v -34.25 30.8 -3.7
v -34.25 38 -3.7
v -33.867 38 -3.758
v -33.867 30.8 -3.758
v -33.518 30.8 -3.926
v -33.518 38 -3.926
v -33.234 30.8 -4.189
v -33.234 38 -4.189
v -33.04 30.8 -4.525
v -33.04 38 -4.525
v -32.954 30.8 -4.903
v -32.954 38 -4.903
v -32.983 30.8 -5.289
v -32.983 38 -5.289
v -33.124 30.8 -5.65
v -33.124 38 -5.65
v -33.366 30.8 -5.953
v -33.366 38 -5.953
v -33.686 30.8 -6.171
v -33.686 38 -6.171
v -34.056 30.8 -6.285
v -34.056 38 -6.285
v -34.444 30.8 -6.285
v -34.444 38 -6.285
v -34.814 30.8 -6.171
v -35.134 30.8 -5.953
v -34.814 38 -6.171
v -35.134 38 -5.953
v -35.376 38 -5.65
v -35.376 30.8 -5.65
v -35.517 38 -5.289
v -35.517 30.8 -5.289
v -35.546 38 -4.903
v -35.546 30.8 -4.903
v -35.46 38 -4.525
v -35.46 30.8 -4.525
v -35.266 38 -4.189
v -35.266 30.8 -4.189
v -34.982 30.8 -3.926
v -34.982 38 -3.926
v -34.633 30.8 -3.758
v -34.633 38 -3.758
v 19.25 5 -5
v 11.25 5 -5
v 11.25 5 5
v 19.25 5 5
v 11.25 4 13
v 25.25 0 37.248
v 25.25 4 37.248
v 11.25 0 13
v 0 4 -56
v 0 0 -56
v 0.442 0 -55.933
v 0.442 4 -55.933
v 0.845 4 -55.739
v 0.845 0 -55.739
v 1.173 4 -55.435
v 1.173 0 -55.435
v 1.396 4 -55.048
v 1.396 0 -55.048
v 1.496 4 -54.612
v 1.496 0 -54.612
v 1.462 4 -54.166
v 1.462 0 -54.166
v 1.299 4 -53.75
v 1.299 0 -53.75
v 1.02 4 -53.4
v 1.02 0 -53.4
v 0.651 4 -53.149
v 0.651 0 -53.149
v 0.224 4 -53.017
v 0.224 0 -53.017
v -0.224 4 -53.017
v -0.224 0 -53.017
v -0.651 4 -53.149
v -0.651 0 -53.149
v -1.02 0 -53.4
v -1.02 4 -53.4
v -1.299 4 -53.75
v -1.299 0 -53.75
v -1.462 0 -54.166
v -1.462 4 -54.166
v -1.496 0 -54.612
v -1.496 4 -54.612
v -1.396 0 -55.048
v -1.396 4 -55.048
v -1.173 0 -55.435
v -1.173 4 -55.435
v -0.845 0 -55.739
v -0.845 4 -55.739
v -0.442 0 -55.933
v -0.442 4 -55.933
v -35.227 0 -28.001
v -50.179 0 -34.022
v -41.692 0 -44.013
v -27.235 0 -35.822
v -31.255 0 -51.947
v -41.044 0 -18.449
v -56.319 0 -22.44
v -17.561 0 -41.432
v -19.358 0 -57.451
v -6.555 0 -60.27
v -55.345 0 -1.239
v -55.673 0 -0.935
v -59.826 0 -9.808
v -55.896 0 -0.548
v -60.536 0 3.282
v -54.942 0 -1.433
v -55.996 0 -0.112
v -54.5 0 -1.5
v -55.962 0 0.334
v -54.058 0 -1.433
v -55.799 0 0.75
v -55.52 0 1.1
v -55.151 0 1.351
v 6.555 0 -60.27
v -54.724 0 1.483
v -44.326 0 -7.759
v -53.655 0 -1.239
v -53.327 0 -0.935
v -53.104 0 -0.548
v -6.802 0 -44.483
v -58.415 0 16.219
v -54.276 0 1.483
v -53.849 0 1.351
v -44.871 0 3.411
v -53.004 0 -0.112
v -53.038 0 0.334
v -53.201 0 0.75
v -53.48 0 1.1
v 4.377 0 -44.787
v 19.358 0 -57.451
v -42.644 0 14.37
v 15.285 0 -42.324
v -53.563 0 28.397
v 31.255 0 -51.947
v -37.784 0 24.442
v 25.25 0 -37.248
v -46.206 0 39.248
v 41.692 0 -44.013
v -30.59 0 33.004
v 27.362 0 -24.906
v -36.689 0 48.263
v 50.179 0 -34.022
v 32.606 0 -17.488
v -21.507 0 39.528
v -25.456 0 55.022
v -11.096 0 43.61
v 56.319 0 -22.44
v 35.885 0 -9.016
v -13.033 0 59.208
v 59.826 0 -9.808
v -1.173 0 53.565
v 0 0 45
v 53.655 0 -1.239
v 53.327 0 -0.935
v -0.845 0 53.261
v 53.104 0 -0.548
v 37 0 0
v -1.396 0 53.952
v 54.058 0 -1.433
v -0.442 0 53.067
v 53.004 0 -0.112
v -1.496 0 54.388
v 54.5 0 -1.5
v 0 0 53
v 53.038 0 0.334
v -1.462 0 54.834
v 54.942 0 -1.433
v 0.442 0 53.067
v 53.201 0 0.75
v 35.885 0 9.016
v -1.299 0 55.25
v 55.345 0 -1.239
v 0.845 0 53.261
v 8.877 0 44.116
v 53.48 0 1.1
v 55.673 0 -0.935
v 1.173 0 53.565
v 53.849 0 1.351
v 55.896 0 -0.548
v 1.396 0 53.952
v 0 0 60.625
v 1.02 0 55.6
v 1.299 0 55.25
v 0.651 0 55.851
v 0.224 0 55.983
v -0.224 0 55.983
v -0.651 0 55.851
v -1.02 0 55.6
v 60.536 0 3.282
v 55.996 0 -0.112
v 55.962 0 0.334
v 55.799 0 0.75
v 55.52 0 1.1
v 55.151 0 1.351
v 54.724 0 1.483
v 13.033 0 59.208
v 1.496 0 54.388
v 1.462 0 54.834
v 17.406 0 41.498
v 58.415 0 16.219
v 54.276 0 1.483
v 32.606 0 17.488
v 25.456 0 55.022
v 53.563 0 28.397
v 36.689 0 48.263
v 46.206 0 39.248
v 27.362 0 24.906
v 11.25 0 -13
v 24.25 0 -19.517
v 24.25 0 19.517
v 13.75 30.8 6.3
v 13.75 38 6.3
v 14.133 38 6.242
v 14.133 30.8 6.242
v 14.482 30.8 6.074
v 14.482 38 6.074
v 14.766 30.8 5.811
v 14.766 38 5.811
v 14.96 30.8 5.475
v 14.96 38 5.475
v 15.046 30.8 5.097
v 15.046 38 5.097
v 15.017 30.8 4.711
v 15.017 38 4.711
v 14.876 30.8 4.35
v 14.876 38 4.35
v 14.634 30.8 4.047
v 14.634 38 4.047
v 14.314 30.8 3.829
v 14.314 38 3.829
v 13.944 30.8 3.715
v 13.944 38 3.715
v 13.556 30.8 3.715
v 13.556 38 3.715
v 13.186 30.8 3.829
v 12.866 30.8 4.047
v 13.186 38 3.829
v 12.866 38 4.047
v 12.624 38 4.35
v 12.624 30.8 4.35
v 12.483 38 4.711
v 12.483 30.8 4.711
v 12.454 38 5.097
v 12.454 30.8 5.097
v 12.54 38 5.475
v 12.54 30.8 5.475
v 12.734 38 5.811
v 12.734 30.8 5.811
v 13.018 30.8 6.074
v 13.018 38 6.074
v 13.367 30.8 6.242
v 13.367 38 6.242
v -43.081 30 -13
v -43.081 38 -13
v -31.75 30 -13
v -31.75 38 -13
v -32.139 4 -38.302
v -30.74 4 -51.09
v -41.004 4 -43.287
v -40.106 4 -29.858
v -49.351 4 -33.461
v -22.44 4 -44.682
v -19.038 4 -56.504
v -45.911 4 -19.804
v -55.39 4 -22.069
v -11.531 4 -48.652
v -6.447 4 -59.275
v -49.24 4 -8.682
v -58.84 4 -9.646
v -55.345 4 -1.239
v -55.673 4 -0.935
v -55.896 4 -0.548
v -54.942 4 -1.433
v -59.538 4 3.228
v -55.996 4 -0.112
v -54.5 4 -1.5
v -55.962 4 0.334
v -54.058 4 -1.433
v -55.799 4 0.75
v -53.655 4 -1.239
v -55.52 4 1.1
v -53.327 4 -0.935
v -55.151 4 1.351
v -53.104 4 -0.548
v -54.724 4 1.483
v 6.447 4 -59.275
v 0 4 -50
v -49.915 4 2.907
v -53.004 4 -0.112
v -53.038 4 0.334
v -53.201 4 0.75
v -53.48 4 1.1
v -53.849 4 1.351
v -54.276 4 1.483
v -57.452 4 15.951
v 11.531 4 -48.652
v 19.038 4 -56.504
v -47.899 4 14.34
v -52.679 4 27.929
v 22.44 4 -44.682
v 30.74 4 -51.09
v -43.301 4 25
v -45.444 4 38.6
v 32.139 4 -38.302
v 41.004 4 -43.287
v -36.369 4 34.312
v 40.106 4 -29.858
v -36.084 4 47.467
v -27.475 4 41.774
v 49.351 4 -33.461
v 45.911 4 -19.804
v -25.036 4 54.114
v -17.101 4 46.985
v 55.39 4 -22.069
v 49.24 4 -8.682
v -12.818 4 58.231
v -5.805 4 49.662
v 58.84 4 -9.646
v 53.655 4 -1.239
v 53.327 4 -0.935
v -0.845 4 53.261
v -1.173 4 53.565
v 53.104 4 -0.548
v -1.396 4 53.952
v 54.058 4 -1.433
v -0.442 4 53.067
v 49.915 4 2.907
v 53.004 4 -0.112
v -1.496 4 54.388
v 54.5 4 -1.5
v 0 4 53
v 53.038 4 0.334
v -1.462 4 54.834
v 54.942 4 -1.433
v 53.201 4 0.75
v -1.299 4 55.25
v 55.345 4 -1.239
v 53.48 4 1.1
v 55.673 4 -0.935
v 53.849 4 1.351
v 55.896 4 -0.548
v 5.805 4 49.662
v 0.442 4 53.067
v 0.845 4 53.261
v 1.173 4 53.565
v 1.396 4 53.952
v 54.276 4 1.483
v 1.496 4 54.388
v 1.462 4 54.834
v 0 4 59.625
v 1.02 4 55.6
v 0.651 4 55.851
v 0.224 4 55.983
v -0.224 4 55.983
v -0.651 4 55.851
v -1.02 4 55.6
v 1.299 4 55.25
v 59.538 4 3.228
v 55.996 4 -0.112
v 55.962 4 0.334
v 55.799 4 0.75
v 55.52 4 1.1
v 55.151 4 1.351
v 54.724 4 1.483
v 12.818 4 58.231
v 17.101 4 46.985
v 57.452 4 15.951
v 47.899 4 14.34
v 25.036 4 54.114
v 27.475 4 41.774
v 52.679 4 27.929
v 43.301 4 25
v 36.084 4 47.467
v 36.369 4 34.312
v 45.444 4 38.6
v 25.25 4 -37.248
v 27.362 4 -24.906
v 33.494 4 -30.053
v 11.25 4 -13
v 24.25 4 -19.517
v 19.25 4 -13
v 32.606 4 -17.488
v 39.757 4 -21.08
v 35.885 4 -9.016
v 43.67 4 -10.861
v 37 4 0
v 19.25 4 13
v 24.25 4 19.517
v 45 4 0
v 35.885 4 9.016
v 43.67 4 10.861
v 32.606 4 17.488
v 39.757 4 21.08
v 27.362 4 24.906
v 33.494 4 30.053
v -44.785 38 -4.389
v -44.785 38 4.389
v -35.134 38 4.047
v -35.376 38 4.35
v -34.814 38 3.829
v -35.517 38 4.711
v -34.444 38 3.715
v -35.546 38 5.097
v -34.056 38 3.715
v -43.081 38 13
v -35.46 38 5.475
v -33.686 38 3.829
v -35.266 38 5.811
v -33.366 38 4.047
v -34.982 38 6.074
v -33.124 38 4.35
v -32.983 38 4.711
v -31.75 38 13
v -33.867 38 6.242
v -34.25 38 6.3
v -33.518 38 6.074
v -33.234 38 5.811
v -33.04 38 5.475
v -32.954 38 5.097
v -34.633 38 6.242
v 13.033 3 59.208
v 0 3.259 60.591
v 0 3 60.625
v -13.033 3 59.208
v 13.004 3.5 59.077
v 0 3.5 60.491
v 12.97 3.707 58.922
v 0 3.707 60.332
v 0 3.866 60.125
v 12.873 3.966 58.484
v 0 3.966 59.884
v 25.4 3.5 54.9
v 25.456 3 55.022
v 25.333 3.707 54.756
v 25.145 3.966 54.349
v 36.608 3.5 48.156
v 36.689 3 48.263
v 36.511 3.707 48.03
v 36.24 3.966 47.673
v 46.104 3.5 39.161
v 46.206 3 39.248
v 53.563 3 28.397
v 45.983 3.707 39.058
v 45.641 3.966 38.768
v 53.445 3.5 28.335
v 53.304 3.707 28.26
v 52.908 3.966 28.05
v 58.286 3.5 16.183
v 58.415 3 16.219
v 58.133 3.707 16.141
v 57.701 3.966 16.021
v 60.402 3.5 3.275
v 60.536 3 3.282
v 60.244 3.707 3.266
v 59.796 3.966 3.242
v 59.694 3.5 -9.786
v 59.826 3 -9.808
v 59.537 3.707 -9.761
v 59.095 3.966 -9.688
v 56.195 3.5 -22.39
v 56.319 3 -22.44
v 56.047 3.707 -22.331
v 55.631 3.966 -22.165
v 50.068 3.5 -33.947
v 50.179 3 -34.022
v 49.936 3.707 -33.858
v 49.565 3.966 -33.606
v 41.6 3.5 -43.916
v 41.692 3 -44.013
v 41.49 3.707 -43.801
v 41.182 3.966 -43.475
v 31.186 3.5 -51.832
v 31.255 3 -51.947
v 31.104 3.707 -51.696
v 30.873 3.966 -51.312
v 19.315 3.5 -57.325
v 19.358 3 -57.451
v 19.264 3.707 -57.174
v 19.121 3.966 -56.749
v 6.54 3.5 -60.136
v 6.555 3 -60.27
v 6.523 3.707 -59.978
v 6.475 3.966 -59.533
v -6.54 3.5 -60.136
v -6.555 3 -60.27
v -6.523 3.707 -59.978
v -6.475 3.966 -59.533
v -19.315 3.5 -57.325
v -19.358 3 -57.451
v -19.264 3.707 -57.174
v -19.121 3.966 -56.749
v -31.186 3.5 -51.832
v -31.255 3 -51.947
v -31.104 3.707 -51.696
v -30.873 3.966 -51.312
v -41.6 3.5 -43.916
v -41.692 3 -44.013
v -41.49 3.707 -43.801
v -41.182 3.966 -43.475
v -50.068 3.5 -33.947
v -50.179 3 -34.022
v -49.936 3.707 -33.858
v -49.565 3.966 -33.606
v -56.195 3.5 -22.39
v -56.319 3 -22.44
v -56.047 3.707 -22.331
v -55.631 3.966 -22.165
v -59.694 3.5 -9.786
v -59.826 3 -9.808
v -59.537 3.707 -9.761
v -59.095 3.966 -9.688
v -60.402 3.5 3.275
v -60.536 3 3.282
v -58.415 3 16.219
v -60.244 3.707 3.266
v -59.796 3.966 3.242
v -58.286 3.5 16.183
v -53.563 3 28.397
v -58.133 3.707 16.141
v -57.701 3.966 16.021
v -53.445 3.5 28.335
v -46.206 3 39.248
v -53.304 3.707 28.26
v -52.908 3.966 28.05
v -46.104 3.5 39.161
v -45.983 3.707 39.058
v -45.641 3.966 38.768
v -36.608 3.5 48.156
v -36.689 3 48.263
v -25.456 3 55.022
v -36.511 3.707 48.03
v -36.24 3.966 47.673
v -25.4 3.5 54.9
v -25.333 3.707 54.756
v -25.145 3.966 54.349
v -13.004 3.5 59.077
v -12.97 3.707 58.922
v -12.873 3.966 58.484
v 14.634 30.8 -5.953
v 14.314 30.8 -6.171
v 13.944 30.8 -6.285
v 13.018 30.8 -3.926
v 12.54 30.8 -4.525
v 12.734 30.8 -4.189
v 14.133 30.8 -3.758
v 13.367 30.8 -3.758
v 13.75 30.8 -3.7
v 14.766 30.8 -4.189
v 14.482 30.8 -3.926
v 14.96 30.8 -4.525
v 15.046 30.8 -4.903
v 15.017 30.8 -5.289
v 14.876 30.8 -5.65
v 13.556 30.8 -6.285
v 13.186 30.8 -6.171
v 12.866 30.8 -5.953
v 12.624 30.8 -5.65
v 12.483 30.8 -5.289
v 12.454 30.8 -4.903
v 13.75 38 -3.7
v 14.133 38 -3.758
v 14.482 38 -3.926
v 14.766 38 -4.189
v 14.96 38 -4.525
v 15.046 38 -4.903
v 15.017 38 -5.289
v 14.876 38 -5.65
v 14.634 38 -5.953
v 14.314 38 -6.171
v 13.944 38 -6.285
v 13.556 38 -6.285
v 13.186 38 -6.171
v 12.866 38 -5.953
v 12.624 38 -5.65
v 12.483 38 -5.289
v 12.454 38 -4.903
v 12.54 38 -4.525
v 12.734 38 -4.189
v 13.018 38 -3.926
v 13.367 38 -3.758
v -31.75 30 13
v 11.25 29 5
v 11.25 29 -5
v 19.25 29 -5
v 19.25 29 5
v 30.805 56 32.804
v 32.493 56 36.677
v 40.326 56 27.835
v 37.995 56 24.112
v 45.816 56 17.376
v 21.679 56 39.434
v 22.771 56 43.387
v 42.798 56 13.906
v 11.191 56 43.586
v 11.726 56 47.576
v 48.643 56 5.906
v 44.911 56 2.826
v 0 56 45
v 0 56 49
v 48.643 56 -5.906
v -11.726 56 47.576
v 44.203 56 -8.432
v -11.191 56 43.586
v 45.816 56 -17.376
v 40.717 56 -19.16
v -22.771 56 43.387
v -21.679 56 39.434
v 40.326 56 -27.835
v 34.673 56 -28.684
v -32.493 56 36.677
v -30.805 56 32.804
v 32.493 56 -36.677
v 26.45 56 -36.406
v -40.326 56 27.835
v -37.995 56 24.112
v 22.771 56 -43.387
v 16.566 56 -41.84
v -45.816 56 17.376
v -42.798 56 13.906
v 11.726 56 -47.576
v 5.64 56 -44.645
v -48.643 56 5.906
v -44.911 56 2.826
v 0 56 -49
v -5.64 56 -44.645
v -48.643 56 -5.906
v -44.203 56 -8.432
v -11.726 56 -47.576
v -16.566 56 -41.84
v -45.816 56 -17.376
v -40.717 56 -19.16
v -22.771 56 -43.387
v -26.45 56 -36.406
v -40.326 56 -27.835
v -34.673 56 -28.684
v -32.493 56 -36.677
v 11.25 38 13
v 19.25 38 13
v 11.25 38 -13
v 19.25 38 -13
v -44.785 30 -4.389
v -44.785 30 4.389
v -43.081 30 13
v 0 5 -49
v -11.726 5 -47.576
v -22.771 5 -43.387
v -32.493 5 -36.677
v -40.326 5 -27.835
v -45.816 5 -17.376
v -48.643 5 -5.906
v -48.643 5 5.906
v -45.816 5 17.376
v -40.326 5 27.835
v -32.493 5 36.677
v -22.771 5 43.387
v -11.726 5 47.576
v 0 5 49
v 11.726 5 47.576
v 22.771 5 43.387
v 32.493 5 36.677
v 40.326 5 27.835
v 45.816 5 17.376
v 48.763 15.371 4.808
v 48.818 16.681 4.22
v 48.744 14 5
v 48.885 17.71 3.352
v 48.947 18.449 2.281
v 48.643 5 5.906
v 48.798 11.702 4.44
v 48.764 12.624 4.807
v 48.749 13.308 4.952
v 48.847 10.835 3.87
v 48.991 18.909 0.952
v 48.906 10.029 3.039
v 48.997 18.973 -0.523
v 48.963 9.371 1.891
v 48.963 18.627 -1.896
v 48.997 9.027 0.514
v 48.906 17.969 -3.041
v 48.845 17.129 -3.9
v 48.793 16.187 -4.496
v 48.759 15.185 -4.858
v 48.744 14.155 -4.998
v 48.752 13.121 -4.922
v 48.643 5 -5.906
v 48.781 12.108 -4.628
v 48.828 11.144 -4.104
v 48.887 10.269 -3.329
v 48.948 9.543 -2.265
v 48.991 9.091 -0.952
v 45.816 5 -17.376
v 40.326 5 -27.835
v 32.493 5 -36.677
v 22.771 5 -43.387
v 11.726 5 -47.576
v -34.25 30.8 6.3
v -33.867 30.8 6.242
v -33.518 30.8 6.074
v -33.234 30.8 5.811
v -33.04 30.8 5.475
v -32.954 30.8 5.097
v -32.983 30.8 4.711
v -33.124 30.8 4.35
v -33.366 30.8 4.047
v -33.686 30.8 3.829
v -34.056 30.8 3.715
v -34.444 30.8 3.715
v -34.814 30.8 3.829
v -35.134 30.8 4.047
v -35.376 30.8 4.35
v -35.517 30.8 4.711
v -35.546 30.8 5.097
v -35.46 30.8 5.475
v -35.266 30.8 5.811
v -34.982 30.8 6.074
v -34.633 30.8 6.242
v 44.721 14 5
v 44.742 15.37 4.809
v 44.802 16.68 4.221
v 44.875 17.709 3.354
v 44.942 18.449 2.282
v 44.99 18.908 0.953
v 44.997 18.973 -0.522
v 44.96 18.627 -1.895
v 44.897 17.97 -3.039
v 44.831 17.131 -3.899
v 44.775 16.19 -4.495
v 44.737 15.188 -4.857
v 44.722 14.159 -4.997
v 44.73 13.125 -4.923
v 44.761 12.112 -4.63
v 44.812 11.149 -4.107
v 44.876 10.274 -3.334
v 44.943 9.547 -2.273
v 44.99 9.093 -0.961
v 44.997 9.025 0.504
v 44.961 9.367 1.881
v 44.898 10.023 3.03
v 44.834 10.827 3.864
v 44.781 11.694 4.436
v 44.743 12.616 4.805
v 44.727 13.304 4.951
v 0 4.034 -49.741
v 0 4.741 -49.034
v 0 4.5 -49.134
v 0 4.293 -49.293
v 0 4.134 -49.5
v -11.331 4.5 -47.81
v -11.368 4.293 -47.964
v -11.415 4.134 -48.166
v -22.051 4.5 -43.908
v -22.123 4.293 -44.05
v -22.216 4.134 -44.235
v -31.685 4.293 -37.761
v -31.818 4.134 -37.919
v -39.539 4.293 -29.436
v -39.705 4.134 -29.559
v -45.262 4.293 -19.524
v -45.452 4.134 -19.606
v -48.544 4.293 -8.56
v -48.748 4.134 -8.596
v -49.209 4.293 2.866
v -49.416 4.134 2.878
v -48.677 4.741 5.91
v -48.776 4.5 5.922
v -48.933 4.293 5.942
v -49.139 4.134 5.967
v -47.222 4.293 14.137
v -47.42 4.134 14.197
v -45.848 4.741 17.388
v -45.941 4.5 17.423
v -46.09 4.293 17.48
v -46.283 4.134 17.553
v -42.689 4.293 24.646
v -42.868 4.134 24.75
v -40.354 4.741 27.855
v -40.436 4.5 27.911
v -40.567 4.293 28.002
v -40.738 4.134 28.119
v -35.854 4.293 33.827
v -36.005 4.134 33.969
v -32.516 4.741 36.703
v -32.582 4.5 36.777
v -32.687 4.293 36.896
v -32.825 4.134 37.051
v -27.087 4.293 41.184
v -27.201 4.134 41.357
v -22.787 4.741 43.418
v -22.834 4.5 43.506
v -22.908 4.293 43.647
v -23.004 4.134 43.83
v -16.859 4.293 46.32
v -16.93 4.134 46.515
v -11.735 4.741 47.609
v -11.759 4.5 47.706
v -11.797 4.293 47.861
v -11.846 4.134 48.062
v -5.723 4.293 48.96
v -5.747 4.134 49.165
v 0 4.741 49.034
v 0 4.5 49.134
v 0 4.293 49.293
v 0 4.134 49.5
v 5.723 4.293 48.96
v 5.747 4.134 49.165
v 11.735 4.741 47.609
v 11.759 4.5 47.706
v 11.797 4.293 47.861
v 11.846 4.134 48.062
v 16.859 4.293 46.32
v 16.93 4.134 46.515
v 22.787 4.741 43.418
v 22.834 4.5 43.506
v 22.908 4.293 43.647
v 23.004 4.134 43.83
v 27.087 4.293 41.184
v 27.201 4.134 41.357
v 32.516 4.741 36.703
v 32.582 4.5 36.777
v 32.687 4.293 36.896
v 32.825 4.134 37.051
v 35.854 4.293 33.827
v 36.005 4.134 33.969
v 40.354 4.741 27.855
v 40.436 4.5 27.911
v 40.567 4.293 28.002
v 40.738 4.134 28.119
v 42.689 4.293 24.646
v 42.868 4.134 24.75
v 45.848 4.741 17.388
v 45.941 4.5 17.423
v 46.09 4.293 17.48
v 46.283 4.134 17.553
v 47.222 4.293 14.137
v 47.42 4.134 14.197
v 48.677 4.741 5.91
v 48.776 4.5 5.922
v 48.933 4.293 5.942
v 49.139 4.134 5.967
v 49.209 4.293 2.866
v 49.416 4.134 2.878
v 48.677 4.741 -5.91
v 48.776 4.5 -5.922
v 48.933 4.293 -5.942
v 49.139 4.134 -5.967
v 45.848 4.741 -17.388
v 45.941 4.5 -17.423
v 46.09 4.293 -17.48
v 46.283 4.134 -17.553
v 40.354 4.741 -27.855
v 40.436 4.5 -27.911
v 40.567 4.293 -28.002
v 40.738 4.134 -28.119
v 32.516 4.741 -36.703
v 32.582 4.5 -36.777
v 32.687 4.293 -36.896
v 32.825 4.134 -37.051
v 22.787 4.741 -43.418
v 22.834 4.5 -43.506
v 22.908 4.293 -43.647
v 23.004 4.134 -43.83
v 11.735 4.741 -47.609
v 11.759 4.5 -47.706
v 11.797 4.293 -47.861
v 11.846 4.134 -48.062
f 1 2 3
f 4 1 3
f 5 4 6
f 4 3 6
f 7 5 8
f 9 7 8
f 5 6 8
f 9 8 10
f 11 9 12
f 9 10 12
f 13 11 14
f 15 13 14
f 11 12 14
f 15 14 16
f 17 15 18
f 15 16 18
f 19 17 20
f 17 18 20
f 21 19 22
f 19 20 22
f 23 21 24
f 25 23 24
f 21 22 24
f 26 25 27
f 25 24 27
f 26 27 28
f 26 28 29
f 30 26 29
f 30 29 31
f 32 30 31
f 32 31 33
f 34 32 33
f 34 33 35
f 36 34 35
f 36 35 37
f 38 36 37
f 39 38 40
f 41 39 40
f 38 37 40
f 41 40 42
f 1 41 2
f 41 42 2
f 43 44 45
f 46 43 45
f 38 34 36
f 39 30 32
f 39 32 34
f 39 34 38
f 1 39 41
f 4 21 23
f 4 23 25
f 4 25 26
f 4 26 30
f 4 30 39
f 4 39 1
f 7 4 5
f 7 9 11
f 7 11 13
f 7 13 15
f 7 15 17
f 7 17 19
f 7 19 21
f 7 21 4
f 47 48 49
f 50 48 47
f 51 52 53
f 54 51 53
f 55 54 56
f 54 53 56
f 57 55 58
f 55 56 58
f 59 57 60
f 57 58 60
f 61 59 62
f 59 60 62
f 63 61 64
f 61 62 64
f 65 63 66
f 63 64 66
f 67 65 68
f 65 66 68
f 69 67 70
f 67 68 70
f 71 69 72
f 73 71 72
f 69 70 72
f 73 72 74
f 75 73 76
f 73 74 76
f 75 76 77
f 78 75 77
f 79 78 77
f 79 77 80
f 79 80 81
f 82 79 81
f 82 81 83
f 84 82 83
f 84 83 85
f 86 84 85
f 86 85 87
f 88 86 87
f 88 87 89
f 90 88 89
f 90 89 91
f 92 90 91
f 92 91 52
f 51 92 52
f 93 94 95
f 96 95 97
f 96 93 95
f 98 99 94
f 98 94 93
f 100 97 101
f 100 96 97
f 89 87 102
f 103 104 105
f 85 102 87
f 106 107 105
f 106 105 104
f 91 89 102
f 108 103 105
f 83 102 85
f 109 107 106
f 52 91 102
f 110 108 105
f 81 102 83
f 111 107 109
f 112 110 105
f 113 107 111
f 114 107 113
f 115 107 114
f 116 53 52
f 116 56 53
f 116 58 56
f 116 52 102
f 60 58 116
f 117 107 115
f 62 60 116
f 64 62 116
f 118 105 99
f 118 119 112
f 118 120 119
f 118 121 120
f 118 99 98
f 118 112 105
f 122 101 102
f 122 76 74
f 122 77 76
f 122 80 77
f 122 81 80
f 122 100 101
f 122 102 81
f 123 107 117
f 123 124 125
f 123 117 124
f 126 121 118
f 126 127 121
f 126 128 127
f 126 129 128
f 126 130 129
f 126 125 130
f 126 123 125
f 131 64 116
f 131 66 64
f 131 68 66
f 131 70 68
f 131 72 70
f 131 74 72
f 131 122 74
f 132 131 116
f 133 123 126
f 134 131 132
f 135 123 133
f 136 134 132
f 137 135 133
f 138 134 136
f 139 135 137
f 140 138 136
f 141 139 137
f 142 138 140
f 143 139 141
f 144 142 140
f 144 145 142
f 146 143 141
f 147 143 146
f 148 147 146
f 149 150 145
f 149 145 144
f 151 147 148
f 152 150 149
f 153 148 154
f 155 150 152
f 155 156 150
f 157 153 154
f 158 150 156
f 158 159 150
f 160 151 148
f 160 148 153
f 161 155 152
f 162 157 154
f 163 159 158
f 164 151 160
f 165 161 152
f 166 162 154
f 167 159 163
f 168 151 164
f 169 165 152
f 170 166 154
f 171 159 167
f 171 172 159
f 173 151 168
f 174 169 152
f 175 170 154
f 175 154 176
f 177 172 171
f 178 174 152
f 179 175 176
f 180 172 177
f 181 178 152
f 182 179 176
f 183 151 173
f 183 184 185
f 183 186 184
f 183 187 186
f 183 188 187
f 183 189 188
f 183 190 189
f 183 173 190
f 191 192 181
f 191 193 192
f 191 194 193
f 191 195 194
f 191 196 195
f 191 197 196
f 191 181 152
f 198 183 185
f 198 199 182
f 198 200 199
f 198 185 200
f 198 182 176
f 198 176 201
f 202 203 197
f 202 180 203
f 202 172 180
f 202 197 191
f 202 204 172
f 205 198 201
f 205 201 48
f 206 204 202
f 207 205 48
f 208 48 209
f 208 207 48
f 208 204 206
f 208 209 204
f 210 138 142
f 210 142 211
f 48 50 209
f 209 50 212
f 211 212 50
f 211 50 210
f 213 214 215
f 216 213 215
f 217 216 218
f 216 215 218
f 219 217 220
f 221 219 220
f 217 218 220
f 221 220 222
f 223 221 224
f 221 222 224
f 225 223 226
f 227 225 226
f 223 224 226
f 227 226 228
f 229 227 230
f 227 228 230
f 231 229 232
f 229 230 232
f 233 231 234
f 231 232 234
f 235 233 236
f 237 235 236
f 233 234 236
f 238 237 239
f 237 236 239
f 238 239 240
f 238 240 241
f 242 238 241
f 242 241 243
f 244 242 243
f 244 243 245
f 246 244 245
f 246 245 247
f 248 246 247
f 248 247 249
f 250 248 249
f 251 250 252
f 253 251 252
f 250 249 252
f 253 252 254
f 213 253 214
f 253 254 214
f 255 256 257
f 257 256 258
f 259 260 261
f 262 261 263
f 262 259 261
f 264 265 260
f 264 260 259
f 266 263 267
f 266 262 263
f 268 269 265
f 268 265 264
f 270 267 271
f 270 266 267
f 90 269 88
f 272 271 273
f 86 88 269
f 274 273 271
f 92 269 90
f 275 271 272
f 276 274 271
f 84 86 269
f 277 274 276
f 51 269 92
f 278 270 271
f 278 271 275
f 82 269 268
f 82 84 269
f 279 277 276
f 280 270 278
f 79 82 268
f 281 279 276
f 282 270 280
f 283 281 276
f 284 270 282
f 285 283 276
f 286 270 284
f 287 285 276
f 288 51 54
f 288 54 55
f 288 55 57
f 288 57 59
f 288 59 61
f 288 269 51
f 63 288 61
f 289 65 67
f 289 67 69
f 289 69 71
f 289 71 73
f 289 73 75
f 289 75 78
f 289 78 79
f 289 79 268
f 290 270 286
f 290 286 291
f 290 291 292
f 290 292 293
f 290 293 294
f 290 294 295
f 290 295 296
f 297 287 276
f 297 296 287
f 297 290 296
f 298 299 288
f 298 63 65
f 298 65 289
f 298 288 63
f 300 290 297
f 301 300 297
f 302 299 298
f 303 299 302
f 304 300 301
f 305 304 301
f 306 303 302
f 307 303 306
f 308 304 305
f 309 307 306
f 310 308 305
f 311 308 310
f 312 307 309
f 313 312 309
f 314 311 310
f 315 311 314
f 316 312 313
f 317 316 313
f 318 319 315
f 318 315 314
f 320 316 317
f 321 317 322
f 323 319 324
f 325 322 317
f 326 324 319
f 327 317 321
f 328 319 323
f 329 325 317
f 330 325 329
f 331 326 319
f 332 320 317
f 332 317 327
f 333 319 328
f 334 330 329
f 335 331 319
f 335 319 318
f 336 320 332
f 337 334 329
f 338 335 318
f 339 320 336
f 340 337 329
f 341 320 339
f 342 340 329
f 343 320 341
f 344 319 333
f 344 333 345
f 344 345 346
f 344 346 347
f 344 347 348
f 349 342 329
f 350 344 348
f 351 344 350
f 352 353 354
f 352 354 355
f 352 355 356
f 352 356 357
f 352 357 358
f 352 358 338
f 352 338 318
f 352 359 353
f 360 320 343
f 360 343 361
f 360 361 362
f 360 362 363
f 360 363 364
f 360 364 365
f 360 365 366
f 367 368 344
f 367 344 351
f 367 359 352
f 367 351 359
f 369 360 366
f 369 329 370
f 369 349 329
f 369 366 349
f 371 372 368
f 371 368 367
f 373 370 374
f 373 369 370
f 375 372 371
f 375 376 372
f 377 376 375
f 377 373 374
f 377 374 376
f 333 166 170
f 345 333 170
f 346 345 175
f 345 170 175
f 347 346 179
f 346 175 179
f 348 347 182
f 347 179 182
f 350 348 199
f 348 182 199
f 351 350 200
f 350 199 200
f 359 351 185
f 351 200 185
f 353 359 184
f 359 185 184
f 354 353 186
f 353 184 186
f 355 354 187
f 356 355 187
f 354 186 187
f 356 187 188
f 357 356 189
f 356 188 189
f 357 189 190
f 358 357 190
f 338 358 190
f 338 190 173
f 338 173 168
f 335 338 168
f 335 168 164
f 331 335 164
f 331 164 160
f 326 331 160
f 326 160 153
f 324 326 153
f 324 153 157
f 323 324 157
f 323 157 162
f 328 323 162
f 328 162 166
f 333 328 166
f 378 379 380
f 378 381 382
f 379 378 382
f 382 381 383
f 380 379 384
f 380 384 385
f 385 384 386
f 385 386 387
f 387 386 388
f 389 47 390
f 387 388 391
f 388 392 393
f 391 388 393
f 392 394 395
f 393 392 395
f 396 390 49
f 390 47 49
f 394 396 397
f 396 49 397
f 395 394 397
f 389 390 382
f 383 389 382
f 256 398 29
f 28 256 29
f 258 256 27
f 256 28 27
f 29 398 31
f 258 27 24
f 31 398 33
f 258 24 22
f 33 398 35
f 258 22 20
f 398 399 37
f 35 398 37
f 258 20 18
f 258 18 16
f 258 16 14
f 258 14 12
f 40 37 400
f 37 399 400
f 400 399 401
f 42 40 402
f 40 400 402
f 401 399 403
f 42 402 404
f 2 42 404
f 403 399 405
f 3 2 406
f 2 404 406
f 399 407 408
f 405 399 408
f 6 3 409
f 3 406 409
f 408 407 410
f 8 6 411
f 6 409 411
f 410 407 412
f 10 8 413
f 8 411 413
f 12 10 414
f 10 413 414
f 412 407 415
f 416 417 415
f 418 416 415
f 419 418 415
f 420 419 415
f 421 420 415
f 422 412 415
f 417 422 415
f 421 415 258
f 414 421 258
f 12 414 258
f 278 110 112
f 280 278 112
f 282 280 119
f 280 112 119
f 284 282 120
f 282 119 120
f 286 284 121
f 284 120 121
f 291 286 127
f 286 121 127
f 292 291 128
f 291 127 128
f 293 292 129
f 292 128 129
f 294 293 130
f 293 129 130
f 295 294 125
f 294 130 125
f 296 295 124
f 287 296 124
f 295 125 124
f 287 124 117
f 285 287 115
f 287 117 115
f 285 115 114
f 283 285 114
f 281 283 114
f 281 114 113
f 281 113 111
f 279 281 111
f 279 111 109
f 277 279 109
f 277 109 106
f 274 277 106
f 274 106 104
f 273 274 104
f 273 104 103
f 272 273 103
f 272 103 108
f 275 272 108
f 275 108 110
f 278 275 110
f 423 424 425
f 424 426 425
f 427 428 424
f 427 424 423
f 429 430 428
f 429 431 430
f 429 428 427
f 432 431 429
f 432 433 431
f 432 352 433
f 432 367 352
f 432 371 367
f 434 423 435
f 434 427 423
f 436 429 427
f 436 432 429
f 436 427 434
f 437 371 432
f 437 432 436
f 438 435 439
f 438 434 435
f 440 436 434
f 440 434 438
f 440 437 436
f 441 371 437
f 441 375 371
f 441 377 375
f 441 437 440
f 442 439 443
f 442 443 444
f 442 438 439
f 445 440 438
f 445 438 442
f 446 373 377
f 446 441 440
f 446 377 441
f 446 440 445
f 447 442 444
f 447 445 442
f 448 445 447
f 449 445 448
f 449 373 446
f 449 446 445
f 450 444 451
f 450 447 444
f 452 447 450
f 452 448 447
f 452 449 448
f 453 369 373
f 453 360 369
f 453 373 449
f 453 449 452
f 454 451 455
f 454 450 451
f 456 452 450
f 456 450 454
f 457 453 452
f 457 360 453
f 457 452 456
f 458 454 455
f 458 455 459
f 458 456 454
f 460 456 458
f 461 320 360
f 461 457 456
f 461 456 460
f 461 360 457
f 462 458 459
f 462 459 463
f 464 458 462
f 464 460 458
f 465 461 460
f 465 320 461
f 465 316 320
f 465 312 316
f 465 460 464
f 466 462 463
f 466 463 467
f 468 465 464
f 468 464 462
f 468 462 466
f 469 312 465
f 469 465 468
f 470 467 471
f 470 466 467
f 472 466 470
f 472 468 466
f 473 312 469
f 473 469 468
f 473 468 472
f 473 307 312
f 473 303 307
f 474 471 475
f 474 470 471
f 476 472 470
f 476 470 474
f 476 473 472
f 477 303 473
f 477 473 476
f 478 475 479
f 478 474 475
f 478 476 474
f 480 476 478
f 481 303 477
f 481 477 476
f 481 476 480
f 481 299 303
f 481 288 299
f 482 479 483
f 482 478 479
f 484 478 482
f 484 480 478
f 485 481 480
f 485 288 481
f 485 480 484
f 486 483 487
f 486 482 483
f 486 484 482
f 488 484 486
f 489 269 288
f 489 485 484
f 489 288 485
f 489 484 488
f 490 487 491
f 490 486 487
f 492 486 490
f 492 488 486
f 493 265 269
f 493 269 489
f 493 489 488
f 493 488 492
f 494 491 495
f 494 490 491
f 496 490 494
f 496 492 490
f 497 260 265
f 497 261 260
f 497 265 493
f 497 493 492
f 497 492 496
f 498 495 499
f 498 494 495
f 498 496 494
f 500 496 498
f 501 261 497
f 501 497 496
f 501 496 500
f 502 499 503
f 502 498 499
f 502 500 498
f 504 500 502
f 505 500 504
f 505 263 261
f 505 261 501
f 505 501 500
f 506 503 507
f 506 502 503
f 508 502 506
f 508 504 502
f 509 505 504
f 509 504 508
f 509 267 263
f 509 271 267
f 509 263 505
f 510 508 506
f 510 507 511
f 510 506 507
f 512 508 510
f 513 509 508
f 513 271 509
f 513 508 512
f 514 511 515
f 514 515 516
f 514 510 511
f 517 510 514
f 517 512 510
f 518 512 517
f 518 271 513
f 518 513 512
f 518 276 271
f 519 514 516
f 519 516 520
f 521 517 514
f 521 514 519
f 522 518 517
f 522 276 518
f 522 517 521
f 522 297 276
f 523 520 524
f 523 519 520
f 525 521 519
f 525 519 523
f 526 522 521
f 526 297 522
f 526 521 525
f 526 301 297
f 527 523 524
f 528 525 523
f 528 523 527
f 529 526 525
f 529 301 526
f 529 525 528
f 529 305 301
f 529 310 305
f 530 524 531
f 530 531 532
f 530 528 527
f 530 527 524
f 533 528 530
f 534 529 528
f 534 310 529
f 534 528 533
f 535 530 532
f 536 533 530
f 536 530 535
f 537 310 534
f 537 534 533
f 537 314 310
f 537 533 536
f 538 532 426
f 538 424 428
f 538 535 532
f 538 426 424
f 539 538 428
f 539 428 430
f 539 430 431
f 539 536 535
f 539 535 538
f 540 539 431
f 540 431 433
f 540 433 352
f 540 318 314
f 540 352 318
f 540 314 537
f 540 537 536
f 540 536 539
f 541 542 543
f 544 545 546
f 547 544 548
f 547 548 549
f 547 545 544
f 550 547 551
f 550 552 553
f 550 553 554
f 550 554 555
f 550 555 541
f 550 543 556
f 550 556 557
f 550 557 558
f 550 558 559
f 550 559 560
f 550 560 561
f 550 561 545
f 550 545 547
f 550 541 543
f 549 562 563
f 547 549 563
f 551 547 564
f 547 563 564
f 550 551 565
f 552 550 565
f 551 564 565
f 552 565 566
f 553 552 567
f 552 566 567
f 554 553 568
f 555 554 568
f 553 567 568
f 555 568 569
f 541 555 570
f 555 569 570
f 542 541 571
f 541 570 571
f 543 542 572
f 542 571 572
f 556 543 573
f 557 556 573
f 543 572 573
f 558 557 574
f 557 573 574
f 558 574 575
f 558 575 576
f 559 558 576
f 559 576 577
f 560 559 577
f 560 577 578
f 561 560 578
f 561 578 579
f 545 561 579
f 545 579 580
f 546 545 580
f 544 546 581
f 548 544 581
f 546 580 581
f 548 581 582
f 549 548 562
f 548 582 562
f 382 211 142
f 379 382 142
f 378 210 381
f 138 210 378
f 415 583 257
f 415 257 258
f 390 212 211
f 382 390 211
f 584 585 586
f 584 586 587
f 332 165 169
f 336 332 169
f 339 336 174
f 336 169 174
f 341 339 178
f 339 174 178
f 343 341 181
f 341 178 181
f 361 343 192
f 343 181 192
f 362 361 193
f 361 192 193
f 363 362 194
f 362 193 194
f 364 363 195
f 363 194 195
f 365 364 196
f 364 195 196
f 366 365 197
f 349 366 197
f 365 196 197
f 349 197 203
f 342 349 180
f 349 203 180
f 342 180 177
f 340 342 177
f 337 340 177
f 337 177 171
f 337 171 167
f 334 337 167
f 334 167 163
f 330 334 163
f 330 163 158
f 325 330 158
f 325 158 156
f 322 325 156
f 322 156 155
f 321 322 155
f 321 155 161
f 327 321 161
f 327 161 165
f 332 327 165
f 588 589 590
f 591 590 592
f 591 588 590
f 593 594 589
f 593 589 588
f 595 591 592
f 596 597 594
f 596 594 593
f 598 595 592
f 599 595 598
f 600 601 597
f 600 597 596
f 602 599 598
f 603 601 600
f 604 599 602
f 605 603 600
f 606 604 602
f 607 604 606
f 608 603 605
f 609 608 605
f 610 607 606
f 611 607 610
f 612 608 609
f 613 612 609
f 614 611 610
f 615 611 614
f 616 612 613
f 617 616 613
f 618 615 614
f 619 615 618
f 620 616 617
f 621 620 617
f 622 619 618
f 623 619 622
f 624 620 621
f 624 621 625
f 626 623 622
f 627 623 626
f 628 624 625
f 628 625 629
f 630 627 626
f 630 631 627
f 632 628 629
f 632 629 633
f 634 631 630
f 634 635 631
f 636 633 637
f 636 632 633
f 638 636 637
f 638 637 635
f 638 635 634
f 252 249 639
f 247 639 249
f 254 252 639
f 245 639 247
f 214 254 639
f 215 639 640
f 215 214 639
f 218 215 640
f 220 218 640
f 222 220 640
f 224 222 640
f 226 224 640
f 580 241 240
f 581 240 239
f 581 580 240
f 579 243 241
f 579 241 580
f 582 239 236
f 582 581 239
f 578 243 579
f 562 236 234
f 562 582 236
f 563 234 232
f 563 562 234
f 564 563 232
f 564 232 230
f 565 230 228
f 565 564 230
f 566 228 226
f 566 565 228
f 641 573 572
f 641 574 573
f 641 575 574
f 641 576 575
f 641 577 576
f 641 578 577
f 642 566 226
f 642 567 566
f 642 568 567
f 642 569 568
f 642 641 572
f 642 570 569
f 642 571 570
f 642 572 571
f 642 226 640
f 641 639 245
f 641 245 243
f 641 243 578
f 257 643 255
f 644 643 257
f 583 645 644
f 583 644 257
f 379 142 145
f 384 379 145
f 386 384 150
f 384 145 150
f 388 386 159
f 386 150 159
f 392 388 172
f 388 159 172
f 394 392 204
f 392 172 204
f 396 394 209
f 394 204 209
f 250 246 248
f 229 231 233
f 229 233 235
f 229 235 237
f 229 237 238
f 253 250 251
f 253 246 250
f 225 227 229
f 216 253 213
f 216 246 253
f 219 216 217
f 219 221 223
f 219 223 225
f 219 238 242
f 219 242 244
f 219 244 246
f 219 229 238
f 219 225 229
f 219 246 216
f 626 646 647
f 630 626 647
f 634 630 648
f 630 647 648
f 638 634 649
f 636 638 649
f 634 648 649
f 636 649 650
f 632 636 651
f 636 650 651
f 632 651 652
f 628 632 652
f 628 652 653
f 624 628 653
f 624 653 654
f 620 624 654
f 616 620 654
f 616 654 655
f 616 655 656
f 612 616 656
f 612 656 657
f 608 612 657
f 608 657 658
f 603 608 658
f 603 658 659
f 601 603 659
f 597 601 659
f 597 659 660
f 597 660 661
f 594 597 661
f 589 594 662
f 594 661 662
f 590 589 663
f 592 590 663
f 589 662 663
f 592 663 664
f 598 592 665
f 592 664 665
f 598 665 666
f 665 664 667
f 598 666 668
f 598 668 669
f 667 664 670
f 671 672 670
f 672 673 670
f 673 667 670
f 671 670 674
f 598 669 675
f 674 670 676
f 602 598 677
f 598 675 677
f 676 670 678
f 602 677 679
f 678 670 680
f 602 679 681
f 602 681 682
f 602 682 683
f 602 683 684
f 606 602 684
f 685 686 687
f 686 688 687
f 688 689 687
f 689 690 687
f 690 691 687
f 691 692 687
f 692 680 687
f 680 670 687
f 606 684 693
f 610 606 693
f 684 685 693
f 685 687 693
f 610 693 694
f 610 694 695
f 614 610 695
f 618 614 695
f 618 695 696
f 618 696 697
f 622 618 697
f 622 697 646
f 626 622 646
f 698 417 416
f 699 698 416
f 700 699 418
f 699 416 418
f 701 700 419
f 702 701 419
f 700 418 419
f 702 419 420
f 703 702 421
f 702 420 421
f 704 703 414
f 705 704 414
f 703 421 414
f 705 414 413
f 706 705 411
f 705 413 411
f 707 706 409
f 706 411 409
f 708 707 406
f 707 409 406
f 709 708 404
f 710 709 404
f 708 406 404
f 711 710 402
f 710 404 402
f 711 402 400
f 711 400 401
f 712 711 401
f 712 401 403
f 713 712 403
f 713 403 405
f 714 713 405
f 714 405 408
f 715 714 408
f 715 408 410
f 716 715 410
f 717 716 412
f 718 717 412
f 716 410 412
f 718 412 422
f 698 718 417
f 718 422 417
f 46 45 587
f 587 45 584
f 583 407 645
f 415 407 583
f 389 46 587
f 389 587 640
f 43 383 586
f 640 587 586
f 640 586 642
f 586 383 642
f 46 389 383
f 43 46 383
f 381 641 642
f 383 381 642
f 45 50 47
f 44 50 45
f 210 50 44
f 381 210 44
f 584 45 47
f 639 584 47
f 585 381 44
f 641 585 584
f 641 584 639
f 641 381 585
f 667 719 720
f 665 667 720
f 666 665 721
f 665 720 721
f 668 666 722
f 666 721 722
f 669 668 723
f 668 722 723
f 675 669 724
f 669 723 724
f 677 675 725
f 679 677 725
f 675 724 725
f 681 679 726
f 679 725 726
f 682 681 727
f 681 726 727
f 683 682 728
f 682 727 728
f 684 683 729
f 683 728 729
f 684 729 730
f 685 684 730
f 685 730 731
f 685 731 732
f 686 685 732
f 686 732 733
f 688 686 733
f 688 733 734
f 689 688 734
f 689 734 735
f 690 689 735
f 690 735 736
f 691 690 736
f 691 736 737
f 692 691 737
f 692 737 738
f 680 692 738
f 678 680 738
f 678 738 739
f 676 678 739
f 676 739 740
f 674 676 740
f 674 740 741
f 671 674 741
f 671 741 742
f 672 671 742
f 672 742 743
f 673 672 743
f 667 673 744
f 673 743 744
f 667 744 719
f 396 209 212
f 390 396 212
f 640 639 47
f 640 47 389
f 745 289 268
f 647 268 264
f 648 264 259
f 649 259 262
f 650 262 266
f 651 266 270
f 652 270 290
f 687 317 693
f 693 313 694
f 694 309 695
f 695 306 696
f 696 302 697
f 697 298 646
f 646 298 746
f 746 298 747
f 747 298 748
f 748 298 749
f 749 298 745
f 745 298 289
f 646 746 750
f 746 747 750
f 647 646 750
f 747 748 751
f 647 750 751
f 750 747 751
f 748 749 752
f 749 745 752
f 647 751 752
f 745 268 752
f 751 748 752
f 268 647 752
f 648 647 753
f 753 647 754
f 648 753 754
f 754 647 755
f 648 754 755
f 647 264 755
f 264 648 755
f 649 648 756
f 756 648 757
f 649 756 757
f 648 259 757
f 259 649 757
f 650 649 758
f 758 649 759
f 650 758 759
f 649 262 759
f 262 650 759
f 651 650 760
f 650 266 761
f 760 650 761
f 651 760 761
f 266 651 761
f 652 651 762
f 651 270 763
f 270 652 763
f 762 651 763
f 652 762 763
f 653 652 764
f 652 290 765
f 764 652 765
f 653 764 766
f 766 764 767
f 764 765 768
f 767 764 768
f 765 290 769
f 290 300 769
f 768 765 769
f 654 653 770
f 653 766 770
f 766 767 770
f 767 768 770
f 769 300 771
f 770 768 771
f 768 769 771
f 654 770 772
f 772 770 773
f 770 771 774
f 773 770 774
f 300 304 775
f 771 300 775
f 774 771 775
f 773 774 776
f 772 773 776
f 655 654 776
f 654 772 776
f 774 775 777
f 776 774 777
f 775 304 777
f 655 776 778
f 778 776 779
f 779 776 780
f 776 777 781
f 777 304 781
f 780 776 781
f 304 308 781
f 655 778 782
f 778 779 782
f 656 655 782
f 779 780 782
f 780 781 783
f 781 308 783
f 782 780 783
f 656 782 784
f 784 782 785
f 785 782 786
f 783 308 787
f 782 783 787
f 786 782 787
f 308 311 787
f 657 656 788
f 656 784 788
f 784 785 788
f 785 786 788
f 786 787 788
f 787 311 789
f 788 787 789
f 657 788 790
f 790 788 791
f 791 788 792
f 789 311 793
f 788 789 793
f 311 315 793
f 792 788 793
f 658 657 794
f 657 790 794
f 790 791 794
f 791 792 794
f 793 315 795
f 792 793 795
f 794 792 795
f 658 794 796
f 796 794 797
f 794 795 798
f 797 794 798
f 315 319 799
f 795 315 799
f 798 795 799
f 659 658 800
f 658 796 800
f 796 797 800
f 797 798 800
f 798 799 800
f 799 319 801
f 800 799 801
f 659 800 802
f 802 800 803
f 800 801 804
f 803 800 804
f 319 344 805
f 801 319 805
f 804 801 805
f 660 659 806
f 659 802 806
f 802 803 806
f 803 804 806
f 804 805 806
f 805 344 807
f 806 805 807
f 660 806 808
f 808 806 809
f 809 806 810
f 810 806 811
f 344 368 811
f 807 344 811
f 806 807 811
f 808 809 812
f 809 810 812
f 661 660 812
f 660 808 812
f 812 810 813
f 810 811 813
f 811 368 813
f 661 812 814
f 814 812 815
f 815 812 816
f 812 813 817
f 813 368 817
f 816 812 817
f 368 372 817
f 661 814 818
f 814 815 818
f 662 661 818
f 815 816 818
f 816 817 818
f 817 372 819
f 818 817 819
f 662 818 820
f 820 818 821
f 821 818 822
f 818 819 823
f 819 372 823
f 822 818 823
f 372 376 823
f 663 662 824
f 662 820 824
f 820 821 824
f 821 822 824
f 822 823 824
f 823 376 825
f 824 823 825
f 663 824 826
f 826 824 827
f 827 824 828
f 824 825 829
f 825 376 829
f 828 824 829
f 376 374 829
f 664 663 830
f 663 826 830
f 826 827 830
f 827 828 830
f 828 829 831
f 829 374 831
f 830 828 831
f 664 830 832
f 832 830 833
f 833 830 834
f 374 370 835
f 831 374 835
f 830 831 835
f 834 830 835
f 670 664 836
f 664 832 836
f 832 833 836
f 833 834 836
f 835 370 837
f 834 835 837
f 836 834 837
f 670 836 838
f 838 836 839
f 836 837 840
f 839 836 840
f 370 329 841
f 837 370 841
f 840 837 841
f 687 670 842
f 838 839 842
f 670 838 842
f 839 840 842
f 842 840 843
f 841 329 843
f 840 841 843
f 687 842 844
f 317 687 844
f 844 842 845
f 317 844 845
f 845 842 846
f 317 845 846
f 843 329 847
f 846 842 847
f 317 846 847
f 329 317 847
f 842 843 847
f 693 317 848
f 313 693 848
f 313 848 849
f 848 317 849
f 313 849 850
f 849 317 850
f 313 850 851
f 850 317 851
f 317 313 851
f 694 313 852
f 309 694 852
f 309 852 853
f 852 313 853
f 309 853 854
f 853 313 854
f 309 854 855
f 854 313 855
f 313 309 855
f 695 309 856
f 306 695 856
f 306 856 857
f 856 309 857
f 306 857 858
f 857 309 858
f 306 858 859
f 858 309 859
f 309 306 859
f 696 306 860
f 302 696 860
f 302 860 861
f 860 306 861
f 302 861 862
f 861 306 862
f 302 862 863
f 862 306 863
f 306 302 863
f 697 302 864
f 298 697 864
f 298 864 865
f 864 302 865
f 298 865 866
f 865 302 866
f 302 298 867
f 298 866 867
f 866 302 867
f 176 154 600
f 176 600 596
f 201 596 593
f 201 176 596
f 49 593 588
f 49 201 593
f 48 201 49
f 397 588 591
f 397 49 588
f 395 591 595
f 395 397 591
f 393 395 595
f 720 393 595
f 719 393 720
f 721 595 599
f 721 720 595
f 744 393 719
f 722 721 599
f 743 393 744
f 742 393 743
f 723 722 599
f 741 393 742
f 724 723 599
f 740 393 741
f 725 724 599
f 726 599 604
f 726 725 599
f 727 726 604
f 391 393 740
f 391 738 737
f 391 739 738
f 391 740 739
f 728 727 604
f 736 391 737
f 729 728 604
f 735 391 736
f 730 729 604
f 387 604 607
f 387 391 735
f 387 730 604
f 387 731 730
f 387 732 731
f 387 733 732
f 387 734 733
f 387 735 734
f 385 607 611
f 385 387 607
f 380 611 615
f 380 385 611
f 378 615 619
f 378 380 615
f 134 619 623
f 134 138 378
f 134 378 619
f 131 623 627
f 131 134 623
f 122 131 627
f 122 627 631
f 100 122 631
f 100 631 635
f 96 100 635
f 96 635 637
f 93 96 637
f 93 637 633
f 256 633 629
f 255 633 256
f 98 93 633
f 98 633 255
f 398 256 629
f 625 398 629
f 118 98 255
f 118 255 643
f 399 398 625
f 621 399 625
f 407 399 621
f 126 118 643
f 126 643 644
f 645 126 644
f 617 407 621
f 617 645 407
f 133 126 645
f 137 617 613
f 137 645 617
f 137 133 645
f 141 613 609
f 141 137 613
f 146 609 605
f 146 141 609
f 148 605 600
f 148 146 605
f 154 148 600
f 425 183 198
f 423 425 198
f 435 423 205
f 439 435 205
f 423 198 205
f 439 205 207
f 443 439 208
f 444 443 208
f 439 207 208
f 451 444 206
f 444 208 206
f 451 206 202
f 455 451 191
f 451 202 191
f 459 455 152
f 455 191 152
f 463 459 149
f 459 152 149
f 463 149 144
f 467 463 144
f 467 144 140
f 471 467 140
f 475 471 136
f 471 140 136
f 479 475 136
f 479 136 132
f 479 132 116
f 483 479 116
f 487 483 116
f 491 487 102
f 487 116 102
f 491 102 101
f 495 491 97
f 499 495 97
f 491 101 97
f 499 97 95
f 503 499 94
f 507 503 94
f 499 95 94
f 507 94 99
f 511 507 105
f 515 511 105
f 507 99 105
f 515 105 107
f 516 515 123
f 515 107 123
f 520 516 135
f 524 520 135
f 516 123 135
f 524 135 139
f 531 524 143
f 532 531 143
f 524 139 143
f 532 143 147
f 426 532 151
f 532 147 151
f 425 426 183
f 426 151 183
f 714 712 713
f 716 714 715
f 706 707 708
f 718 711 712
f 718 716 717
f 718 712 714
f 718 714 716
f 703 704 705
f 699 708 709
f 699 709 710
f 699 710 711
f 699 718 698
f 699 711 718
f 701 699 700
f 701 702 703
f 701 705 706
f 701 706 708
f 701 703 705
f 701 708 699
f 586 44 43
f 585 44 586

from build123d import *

# Parameters (mm, degrees)
SKETCH1_R           = 60.625
SKETCH1_R_2         = 45
BOSS_EXTRUDE1_DEPTH = 4
SKETCH2_R           = 49
SKETCH2_R_2         = 45
BOSS_EXTRUDE2_DEPTH = 52
SKETCH3_W           = 8
SKETCH3_H           = 38
SKETCH3_W_2         = 15
SKETCH3_H_2         = 8
BOSS_EXTRUDE3_DEPTH = 13
SKETCH4_W           = 10
SKETCH4_H           = 24
CUT_EXTRUDE1_DEPTH  = 8
SKETCH5_R           = 5
CUT_EXTRUDE2_DEPTH  = 110.441337026
SKETCH6_R           = 1.3
CUT_EXTRUDE3_DEPTH  = 7.2
BOSS_EXTRUDE4_DEPTH = 4
SKETCH8_R           = 1.5
CUT_EXTRUDE4_DEPTH  = 103.404986506
FILLET1_R           = 1


with BuildPart() as part:
    # Sketch1 → Boss-Extrude1 (new body)
    with BuildSketch(Plane(origin=(0, 0, 0), x_dir=(1, 0, 0), z_dir=(0, 1, 0))):
        with Locations(Location((0, 0, 0), (0, 0, 270))):
            Circle(SKETCH1_R)
        with Locations(Location((0, 0, 0), (0, 0, 270))):
            Circle(SKETCH1_R_2, mode=Mode.SUBTRACT)
    extrude(amount=BOSS_EXTRUDE1_DEPTH)

    # Sketch2 → Boss-Extrude2 (add)
    with BuildSketch(Plane(origin=(0, 4, 0), x_dir=(1, 0, 0), z_dir=(0, 1, 0))):
        with Locations(Location((0, 0, 0), (0, 0, 90))):
            Circle(SKETCH2_R)
        with Locations(Location((0, 0, 0), (0, 0, 270))):
            Circle(SKETCH2_R_2, mode=Mode.SUBTRACT)
    extrude(amount=BOSS_EXTRUDE2_DEPTH)

    # Sketch3 → Boss-Extrude3 (add, symmetric)
    with BuildSketch(Plane.XY):
        with Locations((15.25, 19)):
            Rectangle(SKETCH3_W, SKETCH3_H)
        with Locations((-39.25, 34)):
            Rectangle(SKETCH3_W_2, SKETCH3_H_2)
    extrude(amount=BOSS_EXTRUDE3_DEPTH, both=True)


with BuildPart() as boss_extrude3_piece_1:
    # of the separate pieces the step leaves, piece 1, a body of its own (boss_extrude3_pieces)
    add(part.part.solids().sort_by_distance((0, 0, 60.625))[0])

    # Sketch5 → Cut-Extrude2 (cut, through all)
    with BuildSketch(Plane.ZY.offset(-11.25)):
        with Locations((0, 14)):
            Circle(SKETCH5_R)
    extrude(amount=-CUT_EXTRUDE2_DEPTH, mode=Mode.SUBTRACT)


with BuildPart() as boss_extrude3_piece_2:
    # of the separate pieces the step leaves, piece 2, a body of its own (boss_extrude3_pieces)
    add(part.part.solids().sort_by_distance((11.25, 0, -13))[0])

    # Sketch4 → Cut-Extrude1 (cut)
    with BuildSketch(Plane.ZY.offset(-11.25)):
        with Locations((0, 17)):
            Rectangle(SKETCH4_W, SKETCH4_H)
    extrude(amount=-CUT_EXTRUDE1_DEPTH, mode=Mode.SUBTRACT)


with BuildPart() as cut_extrude3_tool:
    # Sketch6 → Cut-Extrude3 (new body)
    with BuildSketch(Plane(origin=(0, 38, 0), x_dir=(1, 0, 0), z_dir=(0, 1, 0))):
        with Locations(Location((-34.25, 5, 0), (0, 0, 270))):
            Circle(SKETCH6_R)
        with Locations(Location((-34.25, -5, 0), (0, 0, 270))):
            Circle(SKETCH6_R)
        with Locations(Location((13.75, 5, 0), (0, 0, 270))):
            Circle(SKETCH6_R)
        with Locations(Location((13.75, -5, 0), (0, 0, 270))):
            Circle(SKETCH6_R)
    extrude(amount=-CUT_EXTRUDE3_DEPTH)


with BuildPart() as boss_extrude3_piece_1_1:
    add(boss_extrude3_piece_1.part)

    # Cut-Extrude3: cut by cut_extrude3_tool
    add(cut_extrude3_tool.part, mode=Mode.SUBTRACT)



with BuildPart() as boss_extrude3_piece_2_1:
    add(boss_extrude3_piece_2.part)

    # Cut-Extrude3: cut by cut_extrude3_tool
    add(cut_extrude3_tool.part, mode=Mode.SUBTRACT)


with BuildPart() as boss_extrude3_piece_1_2:
    add(boss_extrude3_piece_1_1.part)

    add(boss_extrude3_piece_2_1.part)  # Boss-Extrude4 merges Boss-Extrude3 piece 2
    # Sketch7 → Boss-Extrude4 (add)
    with BuildSketch(Plane.XZ):
        with BuildLine():
            Line((11.25, -13), (25.249838503, -37.248431585))
            ThreePointArc((25.249838503, -37.248431585), (45, 0), (25.249838503, 37.248431585))
            Line((25.249838503, 37.248431585), (11.25, 13))
            Line((11.25, 13), (19.25, 13))
            Line((19.25, 13), (19.25, -13))
            Line((19.25, -13), (11.25, -13))
        make_face()
        with BuildLine():
            ThreePointArc((27.361802413, -24.906460381), (37, 0), (27.361802413, 24.906460381))
            Line((27.361802413, 24.906460381), (24.25, 19.516660498))
            Line((24.25, 19.516660498), (24.25, -19.516660498))
            Line((24.25, -19.516660498), (27.361802413, -24.906460381))
        make_face(mode=Mode.SUBTRACT)
    extrude(amount=-BOSS_EXTRUDE4_DEPTH)

    # Sketch8 → Cut-Extrude4 (cut, through all)
    with BuildSketch(Plane.XZ):
        with Locations(Location((54.5, 0, 0), (0, 0, 270))):
            Circle(SKETCH8_R)
        with Locations(Location((0, -54.5, 0), (0, 0, 270))):
            Circle(SKETCH8_R)
        with Locations(Location((-54.5, 0, 0), (0, 0, 270))):
            Circle(SKETCH8_R)
        with Locations(Location((0, 54.5, 0), (0, 0, 270))):
            Circle(SKETCH8_R)
    extrude(amount=-CUT_EXTRUDE4_DEPTH, mode=Mode.SUBTRACT)

    # Fillet1
    fillet1_edges = [boss_extrude3_piece_1_2.edges().sort_by_distance(p)[0] for p in [
        (0, 4, -60.625),
        (0, 4, 49),
    ]]
    fillet(fillet1_edges, radius=FILLET1_R)


solid = boss_extrude3_piece_1_2.part
